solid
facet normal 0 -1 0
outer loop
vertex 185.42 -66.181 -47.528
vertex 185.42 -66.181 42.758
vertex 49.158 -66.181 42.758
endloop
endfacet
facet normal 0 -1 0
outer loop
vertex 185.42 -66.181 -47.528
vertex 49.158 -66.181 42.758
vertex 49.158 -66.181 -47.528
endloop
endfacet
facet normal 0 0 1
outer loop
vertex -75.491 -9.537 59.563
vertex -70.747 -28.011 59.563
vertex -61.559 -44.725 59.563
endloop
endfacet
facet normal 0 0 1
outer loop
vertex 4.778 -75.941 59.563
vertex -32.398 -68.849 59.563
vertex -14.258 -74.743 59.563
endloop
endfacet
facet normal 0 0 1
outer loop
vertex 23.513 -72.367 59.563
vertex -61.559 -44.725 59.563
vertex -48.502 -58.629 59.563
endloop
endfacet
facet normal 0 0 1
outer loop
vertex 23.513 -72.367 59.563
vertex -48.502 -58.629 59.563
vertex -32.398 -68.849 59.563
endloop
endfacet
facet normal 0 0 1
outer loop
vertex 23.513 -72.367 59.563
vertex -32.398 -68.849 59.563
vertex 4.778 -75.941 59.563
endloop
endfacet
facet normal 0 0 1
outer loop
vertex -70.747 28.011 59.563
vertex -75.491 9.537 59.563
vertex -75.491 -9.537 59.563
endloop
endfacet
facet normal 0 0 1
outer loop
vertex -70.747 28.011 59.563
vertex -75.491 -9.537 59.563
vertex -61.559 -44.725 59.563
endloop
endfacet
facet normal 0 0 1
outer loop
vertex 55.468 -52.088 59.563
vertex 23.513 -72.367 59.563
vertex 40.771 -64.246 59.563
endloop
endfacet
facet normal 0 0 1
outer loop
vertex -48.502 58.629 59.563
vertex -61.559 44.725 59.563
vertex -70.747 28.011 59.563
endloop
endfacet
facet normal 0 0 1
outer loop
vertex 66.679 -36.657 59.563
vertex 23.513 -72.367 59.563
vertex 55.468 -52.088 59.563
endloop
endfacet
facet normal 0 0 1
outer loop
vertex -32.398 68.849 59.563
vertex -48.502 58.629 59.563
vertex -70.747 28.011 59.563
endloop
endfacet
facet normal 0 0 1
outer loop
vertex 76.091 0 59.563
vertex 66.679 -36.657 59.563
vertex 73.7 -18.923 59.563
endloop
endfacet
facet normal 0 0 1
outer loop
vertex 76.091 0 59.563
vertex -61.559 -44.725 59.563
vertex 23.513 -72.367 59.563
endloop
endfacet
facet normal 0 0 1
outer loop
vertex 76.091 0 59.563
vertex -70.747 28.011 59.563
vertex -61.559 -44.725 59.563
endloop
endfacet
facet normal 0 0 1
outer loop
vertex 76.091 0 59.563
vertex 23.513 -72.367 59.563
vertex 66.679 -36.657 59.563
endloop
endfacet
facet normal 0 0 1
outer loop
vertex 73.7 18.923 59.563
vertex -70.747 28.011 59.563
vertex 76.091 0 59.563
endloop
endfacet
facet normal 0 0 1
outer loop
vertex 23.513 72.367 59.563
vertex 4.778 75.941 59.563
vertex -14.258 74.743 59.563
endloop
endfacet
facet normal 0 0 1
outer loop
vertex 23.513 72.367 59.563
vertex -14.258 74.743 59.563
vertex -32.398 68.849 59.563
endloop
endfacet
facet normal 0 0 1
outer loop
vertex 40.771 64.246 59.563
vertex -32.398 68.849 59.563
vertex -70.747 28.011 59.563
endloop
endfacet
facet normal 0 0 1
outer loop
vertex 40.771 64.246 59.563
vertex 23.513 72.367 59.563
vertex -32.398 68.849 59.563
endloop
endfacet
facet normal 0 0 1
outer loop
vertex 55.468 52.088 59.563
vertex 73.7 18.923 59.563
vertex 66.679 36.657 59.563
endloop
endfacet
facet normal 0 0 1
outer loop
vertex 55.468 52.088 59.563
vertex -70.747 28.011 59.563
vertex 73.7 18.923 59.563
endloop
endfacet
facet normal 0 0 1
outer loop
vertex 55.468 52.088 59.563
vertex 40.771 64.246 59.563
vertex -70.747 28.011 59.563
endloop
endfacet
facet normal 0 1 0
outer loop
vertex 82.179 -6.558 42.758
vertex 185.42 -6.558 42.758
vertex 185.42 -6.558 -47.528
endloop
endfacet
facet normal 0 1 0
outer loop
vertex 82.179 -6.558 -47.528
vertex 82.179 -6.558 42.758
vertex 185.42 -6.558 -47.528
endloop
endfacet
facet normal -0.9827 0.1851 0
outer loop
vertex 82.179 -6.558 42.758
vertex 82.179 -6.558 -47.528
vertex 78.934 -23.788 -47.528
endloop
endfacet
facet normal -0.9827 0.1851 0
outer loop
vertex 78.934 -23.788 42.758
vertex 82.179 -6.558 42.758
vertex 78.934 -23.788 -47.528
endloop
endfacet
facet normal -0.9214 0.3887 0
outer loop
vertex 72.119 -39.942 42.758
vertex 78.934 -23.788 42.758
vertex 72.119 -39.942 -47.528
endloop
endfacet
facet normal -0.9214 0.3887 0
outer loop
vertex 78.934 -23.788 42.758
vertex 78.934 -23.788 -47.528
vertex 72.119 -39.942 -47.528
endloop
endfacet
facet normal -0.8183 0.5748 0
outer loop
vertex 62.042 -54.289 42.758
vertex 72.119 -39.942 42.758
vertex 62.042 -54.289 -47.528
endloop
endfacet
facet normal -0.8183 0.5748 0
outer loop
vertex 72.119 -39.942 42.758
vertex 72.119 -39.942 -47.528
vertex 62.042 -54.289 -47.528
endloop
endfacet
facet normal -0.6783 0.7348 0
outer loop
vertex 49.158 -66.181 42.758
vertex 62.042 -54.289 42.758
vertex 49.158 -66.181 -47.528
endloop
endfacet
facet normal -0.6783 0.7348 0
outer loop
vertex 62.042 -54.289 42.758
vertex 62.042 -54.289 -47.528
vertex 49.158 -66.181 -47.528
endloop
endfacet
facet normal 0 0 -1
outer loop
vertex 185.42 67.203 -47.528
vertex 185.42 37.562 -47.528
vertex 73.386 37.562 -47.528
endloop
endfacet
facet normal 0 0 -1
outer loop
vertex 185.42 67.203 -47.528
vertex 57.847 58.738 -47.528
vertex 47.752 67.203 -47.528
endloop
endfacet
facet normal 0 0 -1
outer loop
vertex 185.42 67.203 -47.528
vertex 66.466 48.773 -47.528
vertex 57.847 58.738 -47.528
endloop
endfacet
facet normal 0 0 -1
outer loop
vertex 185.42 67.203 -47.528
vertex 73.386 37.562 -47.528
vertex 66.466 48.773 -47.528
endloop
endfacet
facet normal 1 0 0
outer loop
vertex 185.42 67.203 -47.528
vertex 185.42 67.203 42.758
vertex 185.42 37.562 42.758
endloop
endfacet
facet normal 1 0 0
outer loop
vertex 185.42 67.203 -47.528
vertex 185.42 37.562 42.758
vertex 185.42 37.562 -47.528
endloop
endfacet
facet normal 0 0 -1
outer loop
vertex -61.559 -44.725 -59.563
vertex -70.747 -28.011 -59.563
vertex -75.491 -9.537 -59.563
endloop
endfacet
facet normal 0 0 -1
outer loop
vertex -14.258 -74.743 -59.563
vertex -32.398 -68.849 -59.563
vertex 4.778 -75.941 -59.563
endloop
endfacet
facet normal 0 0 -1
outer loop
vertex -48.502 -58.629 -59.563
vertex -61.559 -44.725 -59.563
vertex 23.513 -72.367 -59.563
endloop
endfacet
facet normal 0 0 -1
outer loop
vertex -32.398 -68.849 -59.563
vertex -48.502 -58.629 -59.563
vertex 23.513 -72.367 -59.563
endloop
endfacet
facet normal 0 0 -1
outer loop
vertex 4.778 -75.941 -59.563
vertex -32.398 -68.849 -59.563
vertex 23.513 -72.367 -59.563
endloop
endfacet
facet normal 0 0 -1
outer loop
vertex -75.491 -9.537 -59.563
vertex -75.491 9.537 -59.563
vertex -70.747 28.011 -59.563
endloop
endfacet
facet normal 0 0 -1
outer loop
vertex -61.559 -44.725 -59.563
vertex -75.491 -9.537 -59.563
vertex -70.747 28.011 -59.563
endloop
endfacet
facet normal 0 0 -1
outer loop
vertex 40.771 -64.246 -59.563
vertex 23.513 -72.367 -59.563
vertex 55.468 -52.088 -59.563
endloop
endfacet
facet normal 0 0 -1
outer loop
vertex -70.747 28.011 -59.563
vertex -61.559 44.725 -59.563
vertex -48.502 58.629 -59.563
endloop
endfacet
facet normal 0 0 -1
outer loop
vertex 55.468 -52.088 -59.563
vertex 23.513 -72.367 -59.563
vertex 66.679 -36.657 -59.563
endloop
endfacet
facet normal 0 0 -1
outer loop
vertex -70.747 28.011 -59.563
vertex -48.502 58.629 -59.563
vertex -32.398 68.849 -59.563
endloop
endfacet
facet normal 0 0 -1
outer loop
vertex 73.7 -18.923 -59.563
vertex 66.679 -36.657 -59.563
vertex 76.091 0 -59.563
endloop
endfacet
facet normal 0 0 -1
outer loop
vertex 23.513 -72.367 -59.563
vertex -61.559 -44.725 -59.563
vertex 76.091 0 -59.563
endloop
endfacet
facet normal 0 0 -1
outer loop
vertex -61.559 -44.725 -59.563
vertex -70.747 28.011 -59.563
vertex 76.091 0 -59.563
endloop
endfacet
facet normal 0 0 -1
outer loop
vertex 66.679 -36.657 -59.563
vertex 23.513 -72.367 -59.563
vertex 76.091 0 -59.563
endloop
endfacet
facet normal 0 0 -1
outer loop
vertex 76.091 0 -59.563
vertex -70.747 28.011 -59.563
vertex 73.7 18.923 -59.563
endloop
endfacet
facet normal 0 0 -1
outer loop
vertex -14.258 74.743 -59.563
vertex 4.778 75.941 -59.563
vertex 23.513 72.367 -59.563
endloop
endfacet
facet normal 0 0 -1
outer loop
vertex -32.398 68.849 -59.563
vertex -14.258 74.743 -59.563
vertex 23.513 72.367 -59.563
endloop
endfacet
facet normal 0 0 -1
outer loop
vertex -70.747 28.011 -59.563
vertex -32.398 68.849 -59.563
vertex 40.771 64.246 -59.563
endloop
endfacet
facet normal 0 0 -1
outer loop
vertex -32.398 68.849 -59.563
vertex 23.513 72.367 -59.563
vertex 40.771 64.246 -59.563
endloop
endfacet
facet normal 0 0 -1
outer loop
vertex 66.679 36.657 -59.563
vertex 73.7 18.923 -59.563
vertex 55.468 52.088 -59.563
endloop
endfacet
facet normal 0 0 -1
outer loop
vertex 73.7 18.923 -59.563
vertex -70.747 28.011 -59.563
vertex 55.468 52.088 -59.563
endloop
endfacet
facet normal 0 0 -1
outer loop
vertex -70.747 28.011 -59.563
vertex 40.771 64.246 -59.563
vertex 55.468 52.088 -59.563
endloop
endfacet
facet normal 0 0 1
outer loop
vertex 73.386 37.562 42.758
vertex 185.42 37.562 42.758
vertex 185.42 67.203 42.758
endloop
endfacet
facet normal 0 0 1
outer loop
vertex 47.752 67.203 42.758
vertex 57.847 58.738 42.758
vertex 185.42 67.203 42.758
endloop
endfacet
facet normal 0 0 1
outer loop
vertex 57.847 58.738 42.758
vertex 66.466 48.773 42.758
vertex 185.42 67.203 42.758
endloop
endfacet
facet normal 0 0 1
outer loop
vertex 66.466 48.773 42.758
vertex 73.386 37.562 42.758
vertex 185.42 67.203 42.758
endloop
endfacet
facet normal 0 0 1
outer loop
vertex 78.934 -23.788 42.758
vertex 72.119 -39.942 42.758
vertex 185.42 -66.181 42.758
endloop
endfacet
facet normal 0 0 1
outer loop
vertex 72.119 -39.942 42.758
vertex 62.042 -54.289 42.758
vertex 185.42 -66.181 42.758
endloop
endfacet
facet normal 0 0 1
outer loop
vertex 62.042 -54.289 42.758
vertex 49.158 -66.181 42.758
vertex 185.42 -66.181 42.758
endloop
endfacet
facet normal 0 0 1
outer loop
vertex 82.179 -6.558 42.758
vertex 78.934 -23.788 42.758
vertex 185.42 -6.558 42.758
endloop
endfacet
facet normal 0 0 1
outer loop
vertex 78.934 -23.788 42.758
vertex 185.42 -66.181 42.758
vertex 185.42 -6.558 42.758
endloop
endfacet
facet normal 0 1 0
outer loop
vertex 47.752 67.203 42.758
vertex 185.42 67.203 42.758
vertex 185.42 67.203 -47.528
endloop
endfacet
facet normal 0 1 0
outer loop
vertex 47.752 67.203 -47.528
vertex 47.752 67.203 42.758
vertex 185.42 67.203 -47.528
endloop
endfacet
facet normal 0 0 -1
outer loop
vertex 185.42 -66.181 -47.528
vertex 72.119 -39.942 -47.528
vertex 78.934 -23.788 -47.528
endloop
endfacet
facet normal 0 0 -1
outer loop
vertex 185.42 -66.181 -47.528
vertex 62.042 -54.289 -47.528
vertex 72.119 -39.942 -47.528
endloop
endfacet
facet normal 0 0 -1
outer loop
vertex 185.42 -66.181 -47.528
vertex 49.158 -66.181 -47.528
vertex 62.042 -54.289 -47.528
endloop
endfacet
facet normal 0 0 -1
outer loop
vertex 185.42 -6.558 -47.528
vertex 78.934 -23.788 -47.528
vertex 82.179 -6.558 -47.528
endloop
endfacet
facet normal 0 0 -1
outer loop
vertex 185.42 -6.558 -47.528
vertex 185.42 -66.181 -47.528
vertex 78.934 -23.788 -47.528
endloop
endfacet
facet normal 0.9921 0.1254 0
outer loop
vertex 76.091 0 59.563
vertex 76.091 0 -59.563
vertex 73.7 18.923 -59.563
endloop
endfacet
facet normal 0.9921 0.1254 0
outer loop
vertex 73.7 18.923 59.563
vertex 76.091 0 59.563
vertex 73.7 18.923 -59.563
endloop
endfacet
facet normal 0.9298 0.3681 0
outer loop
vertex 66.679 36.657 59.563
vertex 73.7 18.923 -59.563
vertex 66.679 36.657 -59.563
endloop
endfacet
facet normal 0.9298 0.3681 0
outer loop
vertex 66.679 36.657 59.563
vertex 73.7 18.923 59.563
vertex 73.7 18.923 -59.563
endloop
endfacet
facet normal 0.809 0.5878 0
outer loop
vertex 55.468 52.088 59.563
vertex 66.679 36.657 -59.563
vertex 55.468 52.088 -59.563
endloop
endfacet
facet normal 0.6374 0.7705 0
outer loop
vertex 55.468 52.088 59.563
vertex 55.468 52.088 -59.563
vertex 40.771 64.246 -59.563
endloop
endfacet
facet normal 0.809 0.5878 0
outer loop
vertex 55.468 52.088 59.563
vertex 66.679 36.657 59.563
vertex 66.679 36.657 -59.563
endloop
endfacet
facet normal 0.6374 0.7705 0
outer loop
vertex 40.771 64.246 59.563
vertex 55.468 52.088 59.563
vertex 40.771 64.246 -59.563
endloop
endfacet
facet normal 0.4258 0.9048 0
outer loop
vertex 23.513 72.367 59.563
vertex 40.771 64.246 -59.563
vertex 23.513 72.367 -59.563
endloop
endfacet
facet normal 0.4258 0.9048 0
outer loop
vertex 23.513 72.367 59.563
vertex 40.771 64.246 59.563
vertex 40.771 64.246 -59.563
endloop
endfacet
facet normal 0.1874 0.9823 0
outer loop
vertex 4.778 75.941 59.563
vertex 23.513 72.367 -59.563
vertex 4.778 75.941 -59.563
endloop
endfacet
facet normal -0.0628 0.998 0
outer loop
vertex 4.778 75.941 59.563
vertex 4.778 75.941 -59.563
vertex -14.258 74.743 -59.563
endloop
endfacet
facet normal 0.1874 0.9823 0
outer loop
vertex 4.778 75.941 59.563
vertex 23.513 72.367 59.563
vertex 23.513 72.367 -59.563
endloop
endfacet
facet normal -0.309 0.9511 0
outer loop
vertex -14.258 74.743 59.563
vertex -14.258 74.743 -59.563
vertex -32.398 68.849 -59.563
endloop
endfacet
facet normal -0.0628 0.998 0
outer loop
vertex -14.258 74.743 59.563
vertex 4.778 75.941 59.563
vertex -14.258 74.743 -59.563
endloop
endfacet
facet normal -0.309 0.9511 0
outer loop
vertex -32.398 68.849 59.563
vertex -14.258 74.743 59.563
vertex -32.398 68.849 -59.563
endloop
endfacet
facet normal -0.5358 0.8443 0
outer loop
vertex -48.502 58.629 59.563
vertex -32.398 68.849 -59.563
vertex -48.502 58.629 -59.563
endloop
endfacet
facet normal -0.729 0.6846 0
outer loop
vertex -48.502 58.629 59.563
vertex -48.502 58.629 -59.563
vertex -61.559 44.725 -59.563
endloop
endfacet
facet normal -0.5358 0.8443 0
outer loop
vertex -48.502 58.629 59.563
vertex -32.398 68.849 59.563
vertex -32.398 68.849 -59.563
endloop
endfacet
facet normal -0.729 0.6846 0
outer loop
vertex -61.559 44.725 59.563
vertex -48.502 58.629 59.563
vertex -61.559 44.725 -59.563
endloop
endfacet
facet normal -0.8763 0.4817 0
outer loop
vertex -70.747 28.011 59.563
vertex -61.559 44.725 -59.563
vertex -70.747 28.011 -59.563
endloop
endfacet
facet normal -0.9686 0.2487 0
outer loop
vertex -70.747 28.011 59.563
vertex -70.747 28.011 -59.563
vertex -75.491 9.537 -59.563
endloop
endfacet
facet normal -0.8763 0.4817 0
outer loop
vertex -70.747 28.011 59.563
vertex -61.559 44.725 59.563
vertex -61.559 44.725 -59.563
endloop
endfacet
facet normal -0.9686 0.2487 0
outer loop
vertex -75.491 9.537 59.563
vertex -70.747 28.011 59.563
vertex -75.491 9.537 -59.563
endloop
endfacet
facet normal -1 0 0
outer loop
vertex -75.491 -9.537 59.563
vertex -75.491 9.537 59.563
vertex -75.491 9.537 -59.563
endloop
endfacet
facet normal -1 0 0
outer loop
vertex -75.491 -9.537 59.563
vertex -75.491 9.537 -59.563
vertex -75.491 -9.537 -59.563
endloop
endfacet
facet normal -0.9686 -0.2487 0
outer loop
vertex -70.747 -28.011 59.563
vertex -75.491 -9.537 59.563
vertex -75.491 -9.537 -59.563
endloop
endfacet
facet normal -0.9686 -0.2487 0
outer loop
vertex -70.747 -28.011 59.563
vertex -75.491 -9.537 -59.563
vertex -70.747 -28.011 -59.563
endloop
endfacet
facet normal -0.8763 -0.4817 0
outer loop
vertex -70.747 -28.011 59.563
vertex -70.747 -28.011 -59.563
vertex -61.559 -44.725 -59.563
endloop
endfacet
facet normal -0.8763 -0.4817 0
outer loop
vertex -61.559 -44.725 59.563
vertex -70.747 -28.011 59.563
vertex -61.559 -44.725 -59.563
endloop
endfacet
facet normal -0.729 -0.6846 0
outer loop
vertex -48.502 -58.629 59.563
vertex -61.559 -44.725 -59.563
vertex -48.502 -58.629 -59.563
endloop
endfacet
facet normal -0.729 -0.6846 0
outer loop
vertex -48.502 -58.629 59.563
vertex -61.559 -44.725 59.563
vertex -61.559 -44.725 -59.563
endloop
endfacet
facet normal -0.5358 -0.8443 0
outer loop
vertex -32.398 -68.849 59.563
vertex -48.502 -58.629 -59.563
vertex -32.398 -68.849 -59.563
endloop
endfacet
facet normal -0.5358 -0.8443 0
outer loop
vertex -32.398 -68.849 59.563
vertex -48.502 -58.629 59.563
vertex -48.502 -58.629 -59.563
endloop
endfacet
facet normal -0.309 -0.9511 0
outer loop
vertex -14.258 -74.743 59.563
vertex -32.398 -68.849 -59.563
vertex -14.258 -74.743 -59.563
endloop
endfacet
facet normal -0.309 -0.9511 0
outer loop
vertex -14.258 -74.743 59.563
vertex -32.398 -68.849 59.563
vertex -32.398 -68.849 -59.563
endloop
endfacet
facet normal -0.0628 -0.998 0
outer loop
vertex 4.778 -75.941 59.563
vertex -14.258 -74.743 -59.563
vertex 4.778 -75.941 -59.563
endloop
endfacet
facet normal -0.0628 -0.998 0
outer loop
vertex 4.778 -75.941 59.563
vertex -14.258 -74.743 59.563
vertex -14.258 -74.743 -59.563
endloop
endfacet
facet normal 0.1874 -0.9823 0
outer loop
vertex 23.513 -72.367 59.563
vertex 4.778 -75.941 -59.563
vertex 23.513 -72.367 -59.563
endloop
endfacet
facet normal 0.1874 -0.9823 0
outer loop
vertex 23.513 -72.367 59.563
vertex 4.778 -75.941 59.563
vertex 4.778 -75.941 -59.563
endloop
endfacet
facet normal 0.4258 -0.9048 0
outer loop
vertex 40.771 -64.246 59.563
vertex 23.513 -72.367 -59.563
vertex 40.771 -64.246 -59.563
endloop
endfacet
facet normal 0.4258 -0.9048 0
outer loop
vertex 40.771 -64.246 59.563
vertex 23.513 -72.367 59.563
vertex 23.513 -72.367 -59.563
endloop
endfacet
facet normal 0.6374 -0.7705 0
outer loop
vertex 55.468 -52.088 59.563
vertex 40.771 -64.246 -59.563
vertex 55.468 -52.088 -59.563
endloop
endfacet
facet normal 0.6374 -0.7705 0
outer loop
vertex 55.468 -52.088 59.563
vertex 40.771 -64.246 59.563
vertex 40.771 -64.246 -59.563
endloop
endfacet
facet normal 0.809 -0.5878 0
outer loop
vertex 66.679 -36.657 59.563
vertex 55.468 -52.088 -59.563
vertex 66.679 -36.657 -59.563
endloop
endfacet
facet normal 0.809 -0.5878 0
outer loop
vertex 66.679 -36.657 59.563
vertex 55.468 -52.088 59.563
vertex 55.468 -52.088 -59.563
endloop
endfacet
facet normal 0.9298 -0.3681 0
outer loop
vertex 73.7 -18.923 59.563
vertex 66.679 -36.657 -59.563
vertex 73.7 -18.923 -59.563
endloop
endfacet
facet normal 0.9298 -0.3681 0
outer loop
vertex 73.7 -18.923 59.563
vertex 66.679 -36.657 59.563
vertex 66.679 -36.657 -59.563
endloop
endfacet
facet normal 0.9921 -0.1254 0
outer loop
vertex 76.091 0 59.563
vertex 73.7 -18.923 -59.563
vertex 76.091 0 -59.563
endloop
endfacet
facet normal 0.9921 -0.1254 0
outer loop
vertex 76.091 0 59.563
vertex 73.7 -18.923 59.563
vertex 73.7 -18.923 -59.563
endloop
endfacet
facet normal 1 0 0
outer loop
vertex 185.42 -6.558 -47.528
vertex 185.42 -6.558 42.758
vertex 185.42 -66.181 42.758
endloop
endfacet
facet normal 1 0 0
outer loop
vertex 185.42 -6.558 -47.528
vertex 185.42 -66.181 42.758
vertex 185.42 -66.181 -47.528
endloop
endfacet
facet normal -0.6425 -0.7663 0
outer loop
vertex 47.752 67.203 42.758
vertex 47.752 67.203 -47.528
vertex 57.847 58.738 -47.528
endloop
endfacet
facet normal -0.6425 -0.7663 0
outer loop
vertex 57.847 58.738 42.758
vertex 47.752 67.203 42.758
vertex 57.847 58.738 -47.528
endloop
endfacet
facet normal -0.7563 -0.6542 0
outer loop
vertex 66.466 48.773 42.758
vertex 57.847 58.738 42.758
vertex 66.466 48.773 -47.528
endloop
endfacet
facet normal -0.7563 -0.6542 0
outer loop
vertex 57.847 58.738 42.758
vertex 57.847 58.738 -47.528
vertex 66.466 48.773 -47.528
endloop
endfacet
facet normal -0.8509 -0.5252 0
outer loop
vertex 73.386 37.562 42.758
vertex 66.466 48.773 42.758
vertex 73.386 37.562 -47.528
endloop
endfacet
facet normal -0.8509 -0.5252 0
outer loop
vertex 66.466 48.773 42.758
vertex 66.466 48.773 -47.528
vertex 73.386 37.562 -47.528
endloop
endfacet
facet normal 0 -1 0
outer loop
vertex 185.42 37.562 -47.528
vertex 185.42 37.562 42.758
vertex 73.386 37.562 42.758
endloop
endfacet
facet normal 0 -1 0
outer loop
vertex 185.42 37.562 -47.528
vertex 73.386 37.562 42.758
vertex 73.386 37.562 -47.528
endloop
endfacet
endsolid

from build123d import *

# Parameters (mm, degrees)
SKETCH1_R                = 76.09074969
BOSS_EXTRUDE1_DEPTH      = 59.563
BOSS_EXTRUDE2_REACH      = 280.793
BOSS_EXTRUDE2_END_RADIUS = 82.44074969
SKETCH2_W                = 90.285613873
SKETCH2_H                = 59.622575199
SKETCH2_H_2              = 29.640937385


with BuildPart() as part:
    # Sketch1 → Boss-Extrude1 (new, symmetric)
    with BuildSketch(Plane.XY):
        Circle(SKETCH1_R)
    extrude(amount=BOSS_EXTRUDE1_DEPTH, both=True)


with BuildPart() as body_2:
    # Boss-Extrude2: up to this cylinder (the profile starts outside it)
    boss_extrude2_end = Plane(origin=(0, 0, -2.384903), z_dir=(0, 0, -1)) * Cylinder(BOSS_EXTRUDE2_END_RADIUS, 727.467499381, mode=Mode.PRIVATE)
    # Sketch2 → Boss-Extrude2 (new, up to the surface)
    with BuildSketch(Plane(origin=(185.42, 0, 0), x_dir=(0, 0, -1), z_dir=(1, 0, 0)), mode=Mode.PRIVATE) as boss_extrude2_sk1:
        with Locations((2.384903008, -36.369770872)):
            Rectangle(SKETCH2_W, SKETCH2_H)
    boss_extrude2_tool1 = extrude(boss_extrude2_sk1.sketch, amount=-BOSS_EXTRUDE2_REACH, mode=Mode.PRIVATE) - boss_extrude2_end
    add(boss_extrude2_tool1.solids().sort_by_distance((185.42, -36.369771, -2.384903))[0])
    # Sketch2 → Boss-Extrude2 (new, up to the surface)
    with BuildSketch(Plane(origin=(185.42, 0, 0), x_dir=(0, 0, -1), z_dir=(1, 0, 0)), mode=Mode.PRIVATE) as boss_extrude2_sk2:
        with Locations((2.384903008, 52.382691068)):
            Rectangle(SKETCH2_W, SKETCH2_H_2)
    boss_extrude2_tool2 = extrude(boss_extrude2_sk2.sketch, amount=-BOSS_EXTRUDE2_REACH, mode=Mode.PRIVATE) - boss_extrude2_end
    add(boss_extrude2_tool2.solids().sort_by_distance((185.42, 52.382691, -2.384903))[0])


solid = Compound([part.part, body_2.part])
